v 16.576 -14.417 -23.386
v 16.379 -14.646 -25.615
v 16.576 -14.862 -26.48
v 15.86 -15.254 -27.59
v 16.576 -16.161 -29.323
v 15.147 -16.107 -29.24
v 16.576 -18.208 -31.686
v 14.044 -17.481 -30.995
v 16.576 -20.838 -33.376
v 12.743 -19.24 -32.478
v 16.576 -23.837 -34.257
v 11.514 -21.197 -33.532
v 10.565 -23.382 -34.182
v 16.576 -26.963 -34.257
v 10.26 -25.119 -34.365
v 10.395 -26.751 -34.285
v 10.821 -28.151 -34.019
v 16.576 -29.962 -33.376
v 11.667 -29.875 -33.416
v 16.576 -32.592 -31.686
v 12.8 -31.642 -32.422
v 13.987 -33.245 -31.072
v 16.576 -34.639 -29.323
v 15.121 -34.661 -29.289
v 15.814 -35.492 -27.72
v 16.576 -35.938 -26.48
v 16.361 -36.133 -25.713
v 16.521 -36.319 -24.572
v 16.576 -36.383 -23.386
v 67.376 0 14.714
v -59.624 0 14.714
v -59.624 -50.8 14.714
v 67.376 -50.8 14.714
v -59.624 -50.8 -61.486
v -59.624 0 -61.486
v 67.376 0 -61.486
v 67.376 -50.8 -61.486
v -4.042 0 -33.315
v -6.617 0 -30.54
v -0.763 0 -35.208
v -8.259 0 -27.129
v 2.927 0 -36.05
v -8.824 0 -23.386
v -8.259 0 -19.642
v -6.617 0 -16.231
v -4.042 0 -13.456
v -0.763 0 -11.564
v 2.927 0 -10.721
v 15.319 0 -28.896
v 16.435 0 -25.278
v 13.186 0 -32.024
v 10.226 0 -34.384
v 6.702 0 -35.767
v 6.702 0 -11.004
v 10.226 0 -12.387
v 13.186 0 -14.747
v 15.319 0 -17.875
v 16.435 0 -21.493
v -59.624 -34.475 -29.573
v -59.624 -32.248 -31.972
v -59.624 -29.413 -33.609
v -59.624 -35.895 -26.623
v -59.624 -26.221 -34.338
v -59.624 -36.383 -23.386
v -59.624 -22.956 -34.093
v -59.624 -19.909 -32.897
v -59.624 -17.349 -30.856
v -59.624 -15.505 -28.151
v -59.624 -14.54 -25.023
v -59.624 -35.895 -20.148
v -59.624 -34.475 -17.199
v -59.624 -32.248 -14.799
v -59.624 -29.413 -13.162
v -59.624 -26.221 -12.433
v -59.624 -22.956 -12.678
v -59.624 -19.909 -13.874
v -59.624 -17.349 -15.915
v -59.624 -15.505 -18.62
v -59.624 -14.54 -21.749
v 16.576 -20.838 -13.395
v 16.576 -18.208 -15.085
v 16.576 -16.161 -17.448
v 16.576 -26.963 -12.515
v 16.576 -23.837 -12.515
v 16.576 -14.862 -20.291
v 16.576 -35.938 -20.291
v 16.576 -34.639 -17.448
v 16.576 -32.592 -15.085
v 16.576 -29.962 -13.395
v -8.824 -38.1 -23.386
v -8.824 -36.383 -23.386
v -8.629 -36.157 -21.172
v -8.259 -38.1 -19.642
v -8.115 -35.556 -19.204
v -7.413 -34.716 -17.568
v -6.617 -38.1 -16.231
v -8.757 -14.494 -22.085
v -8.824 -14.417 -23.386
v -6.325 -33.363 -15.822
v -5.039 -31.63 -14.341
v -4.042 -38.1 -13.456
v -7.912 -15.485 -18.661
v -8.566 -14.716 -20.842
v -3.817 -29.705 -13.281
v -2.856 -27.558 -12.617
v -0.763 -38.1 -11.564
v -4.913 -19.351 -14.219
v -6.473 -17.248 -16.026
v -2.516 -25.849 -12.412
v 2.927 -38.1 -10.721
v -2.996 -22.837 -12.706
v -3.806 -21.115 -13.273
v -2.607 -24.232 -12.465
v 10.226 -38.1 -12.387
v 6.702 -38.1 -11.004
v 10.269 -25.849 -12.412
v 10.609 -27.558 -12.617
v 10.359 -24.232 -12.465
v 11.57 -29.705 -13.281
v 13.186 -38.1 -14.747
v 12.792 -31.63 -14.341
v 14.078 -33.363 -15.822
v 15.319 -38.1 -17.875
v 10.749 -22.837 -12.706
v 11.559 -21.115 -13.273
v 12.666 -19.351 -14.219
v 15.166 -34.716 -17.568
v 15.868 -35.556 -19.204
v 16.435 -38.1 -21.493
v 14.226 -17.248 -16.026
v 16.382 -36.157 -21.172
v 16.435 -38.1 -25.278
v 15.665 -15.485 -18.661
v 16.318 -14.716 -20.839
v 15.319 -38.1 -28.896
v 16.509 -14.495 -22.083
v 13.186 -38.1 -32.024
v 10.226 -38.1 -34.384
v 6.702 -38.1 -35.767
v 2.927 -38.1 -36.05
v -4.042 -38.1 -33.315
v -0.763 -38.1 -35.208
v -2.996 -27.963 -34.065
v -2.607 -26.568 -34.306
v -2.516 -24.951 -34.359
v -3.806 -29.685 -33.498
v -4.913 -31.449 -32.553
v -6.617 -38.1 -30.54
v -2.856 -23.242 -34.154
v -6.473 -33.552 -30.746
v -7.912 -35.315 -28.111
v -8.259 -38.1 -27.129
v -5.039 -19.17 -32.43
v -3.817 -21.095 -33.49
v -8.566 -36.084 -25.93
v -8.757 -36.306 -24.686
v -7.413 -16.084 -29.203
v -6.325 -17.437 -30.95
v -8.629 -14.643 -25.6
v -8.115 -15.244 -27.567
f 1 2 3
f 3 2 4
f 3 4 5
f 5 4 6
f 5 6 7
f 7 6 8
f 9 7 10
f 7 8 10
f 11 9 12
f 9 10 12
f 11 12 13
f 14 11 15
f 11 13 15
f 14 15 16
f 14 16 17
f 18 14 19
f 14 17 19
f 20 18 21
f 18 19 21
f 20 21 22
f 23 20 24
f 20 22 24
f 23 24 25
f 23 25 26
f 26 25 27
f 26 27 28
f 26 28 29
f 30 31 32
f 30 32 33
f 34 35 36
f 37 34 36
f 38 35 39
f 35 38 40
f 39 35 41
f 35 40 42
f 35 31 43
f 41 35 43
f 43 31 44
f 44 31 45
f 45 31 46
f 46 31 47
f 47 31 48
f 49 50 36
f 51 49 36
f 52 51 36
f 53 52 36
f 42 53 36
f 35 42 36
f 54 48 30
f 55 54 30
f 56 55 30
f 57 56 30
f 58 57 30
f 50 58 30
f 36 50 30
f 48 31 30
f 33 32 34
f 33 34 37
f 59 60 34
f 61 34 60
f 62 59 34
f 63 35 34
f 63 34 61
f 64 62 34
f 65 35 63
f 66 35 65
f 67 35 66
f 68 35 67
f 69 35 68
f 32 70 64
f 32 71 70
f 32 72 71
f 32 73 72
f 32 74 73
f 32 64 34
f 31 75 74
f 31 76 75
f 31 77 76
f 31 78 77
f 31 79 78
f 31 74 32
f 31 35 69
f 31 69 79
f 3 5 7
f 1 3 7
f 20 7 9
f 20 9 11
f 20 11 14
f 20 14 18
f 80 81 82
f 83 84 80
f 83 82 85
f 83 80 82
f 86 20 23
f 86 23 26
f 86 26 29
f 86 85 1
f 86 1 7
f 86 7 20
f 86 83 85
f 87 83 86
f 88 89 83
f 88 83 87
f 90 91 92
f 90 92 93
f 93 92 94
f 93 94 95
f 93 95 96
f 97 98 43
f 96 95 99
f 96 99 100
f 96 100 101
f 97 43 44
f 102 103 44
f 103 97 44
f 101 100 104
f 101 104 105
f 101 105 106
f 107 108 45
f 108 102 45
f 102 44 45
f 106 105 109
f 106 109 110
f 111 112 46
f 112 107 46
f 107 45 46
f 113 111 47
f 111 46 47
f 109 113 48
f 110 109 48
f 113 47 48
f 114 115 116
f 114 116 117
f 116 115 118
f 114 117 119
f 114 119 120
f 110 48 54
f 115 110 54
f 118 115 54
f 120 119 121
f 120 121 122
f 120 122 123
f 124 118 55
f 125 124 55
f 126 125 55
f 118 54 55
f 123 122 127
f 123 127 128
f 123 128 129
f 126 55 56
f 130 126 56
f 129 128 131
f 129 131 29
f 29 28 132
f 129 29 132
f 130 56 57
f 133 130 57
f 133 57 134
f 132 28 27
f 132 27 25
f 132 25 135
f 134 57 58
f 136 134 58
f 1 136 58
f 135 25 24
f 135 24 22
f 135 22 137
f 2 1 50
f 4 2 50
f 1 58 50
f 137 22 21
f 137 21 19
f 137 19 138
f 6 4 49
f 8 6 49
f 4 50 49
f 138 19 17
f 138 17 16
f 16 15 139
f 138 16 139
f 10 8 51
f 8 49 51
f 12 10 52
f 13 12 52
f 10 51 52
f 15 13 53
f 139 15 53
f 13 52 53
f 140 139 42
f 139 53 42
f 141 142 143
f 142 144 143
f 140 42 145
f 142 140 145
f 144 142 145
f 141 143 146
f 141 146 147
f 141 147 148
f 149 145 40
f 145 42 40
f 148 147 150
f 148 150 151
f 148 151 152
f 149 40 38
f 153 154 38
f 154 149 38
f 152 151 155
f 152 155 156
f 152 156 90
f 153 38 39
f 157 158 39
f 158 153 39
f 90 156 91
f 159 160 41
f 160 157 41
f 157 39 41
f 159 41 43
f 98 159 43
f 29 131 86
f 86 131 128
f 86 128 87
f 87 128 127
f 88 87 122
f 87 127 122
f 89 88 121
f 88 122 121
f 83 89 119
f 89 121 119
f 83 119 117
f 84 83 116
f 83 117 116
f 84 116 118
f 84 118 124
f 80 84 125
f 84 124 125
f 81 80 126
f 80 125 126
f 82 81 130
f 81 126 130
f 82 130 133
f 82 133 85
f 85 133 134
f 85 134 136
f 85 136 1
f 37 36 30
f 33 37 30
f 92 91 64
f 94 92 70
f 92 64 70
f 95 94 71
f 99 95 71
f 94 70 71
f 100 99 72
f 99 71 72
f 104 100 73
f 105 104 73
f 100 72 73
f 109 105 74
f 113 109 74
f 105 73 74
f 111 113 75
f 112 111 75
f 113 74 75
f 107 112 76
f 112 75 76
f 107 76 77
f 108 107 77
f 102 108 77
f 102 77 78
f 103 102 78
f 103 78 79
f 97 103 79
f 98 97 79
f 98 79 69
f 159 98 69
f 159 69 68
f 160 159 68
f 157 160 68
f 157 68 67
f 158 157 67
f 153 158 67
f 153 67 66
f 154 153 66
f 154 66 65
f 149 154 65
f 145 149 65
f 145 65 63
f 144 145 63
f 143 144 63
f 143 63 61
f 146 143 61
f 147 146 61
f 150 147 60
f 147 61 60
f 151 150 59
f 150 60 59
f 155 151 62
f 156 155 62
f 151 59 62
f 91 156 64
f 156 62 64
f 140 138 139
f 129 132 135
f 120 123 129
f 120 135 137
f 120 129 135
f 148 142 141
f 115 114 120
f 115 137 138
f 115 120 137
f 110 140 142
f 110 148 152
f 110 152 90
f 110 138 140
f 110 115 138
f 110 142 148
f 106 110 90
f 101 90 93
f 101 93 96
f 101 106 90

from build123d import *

# Parameters (mm, degrees)
F0_W     = 127
F0_H     = 76.2
F1_DEPTH = 50.8
F2_R     = 12.7
F3_DEPTH = 38.1
F4_R     = 10.982907
F5_DEPTH = 76.2


with BuildPart() as f1:
    # F0 (on Front) → F1 (new body)
    with BuildSketch(Plane.XZ):
        with Locations((3.876453, -23.385659)):
            Rectangle(F0_W, F0_H)
    extrude(amount=F1_DEPTH)

    # F2 (on face) → F3 (cut)
    with BuildSketch(Plane(origin=(0, 0, 0), x_dir=(-1, 0, 0), z_dir=(0, 1, 0))):
        with Locations((-3.876453, -23.385659)):
            Circle(F2_R)
    extrude(amount=-F3_DEPTH, mode=Mode.SUBTRACT)

    # F4 (on face) → F5 (cut)
    with BuildSketch(Plane(origin=(-59.623547, 0, 0), x_dir=(0, -1, 0), z_dir=(-1, 0, 0))):
        with Locations((25.4, -23.385659)):
            Circle(F4_R)
    extrude(amount=-F5_DEPTH, mode=Mode.SUBTRACT)


solid = f1.part
